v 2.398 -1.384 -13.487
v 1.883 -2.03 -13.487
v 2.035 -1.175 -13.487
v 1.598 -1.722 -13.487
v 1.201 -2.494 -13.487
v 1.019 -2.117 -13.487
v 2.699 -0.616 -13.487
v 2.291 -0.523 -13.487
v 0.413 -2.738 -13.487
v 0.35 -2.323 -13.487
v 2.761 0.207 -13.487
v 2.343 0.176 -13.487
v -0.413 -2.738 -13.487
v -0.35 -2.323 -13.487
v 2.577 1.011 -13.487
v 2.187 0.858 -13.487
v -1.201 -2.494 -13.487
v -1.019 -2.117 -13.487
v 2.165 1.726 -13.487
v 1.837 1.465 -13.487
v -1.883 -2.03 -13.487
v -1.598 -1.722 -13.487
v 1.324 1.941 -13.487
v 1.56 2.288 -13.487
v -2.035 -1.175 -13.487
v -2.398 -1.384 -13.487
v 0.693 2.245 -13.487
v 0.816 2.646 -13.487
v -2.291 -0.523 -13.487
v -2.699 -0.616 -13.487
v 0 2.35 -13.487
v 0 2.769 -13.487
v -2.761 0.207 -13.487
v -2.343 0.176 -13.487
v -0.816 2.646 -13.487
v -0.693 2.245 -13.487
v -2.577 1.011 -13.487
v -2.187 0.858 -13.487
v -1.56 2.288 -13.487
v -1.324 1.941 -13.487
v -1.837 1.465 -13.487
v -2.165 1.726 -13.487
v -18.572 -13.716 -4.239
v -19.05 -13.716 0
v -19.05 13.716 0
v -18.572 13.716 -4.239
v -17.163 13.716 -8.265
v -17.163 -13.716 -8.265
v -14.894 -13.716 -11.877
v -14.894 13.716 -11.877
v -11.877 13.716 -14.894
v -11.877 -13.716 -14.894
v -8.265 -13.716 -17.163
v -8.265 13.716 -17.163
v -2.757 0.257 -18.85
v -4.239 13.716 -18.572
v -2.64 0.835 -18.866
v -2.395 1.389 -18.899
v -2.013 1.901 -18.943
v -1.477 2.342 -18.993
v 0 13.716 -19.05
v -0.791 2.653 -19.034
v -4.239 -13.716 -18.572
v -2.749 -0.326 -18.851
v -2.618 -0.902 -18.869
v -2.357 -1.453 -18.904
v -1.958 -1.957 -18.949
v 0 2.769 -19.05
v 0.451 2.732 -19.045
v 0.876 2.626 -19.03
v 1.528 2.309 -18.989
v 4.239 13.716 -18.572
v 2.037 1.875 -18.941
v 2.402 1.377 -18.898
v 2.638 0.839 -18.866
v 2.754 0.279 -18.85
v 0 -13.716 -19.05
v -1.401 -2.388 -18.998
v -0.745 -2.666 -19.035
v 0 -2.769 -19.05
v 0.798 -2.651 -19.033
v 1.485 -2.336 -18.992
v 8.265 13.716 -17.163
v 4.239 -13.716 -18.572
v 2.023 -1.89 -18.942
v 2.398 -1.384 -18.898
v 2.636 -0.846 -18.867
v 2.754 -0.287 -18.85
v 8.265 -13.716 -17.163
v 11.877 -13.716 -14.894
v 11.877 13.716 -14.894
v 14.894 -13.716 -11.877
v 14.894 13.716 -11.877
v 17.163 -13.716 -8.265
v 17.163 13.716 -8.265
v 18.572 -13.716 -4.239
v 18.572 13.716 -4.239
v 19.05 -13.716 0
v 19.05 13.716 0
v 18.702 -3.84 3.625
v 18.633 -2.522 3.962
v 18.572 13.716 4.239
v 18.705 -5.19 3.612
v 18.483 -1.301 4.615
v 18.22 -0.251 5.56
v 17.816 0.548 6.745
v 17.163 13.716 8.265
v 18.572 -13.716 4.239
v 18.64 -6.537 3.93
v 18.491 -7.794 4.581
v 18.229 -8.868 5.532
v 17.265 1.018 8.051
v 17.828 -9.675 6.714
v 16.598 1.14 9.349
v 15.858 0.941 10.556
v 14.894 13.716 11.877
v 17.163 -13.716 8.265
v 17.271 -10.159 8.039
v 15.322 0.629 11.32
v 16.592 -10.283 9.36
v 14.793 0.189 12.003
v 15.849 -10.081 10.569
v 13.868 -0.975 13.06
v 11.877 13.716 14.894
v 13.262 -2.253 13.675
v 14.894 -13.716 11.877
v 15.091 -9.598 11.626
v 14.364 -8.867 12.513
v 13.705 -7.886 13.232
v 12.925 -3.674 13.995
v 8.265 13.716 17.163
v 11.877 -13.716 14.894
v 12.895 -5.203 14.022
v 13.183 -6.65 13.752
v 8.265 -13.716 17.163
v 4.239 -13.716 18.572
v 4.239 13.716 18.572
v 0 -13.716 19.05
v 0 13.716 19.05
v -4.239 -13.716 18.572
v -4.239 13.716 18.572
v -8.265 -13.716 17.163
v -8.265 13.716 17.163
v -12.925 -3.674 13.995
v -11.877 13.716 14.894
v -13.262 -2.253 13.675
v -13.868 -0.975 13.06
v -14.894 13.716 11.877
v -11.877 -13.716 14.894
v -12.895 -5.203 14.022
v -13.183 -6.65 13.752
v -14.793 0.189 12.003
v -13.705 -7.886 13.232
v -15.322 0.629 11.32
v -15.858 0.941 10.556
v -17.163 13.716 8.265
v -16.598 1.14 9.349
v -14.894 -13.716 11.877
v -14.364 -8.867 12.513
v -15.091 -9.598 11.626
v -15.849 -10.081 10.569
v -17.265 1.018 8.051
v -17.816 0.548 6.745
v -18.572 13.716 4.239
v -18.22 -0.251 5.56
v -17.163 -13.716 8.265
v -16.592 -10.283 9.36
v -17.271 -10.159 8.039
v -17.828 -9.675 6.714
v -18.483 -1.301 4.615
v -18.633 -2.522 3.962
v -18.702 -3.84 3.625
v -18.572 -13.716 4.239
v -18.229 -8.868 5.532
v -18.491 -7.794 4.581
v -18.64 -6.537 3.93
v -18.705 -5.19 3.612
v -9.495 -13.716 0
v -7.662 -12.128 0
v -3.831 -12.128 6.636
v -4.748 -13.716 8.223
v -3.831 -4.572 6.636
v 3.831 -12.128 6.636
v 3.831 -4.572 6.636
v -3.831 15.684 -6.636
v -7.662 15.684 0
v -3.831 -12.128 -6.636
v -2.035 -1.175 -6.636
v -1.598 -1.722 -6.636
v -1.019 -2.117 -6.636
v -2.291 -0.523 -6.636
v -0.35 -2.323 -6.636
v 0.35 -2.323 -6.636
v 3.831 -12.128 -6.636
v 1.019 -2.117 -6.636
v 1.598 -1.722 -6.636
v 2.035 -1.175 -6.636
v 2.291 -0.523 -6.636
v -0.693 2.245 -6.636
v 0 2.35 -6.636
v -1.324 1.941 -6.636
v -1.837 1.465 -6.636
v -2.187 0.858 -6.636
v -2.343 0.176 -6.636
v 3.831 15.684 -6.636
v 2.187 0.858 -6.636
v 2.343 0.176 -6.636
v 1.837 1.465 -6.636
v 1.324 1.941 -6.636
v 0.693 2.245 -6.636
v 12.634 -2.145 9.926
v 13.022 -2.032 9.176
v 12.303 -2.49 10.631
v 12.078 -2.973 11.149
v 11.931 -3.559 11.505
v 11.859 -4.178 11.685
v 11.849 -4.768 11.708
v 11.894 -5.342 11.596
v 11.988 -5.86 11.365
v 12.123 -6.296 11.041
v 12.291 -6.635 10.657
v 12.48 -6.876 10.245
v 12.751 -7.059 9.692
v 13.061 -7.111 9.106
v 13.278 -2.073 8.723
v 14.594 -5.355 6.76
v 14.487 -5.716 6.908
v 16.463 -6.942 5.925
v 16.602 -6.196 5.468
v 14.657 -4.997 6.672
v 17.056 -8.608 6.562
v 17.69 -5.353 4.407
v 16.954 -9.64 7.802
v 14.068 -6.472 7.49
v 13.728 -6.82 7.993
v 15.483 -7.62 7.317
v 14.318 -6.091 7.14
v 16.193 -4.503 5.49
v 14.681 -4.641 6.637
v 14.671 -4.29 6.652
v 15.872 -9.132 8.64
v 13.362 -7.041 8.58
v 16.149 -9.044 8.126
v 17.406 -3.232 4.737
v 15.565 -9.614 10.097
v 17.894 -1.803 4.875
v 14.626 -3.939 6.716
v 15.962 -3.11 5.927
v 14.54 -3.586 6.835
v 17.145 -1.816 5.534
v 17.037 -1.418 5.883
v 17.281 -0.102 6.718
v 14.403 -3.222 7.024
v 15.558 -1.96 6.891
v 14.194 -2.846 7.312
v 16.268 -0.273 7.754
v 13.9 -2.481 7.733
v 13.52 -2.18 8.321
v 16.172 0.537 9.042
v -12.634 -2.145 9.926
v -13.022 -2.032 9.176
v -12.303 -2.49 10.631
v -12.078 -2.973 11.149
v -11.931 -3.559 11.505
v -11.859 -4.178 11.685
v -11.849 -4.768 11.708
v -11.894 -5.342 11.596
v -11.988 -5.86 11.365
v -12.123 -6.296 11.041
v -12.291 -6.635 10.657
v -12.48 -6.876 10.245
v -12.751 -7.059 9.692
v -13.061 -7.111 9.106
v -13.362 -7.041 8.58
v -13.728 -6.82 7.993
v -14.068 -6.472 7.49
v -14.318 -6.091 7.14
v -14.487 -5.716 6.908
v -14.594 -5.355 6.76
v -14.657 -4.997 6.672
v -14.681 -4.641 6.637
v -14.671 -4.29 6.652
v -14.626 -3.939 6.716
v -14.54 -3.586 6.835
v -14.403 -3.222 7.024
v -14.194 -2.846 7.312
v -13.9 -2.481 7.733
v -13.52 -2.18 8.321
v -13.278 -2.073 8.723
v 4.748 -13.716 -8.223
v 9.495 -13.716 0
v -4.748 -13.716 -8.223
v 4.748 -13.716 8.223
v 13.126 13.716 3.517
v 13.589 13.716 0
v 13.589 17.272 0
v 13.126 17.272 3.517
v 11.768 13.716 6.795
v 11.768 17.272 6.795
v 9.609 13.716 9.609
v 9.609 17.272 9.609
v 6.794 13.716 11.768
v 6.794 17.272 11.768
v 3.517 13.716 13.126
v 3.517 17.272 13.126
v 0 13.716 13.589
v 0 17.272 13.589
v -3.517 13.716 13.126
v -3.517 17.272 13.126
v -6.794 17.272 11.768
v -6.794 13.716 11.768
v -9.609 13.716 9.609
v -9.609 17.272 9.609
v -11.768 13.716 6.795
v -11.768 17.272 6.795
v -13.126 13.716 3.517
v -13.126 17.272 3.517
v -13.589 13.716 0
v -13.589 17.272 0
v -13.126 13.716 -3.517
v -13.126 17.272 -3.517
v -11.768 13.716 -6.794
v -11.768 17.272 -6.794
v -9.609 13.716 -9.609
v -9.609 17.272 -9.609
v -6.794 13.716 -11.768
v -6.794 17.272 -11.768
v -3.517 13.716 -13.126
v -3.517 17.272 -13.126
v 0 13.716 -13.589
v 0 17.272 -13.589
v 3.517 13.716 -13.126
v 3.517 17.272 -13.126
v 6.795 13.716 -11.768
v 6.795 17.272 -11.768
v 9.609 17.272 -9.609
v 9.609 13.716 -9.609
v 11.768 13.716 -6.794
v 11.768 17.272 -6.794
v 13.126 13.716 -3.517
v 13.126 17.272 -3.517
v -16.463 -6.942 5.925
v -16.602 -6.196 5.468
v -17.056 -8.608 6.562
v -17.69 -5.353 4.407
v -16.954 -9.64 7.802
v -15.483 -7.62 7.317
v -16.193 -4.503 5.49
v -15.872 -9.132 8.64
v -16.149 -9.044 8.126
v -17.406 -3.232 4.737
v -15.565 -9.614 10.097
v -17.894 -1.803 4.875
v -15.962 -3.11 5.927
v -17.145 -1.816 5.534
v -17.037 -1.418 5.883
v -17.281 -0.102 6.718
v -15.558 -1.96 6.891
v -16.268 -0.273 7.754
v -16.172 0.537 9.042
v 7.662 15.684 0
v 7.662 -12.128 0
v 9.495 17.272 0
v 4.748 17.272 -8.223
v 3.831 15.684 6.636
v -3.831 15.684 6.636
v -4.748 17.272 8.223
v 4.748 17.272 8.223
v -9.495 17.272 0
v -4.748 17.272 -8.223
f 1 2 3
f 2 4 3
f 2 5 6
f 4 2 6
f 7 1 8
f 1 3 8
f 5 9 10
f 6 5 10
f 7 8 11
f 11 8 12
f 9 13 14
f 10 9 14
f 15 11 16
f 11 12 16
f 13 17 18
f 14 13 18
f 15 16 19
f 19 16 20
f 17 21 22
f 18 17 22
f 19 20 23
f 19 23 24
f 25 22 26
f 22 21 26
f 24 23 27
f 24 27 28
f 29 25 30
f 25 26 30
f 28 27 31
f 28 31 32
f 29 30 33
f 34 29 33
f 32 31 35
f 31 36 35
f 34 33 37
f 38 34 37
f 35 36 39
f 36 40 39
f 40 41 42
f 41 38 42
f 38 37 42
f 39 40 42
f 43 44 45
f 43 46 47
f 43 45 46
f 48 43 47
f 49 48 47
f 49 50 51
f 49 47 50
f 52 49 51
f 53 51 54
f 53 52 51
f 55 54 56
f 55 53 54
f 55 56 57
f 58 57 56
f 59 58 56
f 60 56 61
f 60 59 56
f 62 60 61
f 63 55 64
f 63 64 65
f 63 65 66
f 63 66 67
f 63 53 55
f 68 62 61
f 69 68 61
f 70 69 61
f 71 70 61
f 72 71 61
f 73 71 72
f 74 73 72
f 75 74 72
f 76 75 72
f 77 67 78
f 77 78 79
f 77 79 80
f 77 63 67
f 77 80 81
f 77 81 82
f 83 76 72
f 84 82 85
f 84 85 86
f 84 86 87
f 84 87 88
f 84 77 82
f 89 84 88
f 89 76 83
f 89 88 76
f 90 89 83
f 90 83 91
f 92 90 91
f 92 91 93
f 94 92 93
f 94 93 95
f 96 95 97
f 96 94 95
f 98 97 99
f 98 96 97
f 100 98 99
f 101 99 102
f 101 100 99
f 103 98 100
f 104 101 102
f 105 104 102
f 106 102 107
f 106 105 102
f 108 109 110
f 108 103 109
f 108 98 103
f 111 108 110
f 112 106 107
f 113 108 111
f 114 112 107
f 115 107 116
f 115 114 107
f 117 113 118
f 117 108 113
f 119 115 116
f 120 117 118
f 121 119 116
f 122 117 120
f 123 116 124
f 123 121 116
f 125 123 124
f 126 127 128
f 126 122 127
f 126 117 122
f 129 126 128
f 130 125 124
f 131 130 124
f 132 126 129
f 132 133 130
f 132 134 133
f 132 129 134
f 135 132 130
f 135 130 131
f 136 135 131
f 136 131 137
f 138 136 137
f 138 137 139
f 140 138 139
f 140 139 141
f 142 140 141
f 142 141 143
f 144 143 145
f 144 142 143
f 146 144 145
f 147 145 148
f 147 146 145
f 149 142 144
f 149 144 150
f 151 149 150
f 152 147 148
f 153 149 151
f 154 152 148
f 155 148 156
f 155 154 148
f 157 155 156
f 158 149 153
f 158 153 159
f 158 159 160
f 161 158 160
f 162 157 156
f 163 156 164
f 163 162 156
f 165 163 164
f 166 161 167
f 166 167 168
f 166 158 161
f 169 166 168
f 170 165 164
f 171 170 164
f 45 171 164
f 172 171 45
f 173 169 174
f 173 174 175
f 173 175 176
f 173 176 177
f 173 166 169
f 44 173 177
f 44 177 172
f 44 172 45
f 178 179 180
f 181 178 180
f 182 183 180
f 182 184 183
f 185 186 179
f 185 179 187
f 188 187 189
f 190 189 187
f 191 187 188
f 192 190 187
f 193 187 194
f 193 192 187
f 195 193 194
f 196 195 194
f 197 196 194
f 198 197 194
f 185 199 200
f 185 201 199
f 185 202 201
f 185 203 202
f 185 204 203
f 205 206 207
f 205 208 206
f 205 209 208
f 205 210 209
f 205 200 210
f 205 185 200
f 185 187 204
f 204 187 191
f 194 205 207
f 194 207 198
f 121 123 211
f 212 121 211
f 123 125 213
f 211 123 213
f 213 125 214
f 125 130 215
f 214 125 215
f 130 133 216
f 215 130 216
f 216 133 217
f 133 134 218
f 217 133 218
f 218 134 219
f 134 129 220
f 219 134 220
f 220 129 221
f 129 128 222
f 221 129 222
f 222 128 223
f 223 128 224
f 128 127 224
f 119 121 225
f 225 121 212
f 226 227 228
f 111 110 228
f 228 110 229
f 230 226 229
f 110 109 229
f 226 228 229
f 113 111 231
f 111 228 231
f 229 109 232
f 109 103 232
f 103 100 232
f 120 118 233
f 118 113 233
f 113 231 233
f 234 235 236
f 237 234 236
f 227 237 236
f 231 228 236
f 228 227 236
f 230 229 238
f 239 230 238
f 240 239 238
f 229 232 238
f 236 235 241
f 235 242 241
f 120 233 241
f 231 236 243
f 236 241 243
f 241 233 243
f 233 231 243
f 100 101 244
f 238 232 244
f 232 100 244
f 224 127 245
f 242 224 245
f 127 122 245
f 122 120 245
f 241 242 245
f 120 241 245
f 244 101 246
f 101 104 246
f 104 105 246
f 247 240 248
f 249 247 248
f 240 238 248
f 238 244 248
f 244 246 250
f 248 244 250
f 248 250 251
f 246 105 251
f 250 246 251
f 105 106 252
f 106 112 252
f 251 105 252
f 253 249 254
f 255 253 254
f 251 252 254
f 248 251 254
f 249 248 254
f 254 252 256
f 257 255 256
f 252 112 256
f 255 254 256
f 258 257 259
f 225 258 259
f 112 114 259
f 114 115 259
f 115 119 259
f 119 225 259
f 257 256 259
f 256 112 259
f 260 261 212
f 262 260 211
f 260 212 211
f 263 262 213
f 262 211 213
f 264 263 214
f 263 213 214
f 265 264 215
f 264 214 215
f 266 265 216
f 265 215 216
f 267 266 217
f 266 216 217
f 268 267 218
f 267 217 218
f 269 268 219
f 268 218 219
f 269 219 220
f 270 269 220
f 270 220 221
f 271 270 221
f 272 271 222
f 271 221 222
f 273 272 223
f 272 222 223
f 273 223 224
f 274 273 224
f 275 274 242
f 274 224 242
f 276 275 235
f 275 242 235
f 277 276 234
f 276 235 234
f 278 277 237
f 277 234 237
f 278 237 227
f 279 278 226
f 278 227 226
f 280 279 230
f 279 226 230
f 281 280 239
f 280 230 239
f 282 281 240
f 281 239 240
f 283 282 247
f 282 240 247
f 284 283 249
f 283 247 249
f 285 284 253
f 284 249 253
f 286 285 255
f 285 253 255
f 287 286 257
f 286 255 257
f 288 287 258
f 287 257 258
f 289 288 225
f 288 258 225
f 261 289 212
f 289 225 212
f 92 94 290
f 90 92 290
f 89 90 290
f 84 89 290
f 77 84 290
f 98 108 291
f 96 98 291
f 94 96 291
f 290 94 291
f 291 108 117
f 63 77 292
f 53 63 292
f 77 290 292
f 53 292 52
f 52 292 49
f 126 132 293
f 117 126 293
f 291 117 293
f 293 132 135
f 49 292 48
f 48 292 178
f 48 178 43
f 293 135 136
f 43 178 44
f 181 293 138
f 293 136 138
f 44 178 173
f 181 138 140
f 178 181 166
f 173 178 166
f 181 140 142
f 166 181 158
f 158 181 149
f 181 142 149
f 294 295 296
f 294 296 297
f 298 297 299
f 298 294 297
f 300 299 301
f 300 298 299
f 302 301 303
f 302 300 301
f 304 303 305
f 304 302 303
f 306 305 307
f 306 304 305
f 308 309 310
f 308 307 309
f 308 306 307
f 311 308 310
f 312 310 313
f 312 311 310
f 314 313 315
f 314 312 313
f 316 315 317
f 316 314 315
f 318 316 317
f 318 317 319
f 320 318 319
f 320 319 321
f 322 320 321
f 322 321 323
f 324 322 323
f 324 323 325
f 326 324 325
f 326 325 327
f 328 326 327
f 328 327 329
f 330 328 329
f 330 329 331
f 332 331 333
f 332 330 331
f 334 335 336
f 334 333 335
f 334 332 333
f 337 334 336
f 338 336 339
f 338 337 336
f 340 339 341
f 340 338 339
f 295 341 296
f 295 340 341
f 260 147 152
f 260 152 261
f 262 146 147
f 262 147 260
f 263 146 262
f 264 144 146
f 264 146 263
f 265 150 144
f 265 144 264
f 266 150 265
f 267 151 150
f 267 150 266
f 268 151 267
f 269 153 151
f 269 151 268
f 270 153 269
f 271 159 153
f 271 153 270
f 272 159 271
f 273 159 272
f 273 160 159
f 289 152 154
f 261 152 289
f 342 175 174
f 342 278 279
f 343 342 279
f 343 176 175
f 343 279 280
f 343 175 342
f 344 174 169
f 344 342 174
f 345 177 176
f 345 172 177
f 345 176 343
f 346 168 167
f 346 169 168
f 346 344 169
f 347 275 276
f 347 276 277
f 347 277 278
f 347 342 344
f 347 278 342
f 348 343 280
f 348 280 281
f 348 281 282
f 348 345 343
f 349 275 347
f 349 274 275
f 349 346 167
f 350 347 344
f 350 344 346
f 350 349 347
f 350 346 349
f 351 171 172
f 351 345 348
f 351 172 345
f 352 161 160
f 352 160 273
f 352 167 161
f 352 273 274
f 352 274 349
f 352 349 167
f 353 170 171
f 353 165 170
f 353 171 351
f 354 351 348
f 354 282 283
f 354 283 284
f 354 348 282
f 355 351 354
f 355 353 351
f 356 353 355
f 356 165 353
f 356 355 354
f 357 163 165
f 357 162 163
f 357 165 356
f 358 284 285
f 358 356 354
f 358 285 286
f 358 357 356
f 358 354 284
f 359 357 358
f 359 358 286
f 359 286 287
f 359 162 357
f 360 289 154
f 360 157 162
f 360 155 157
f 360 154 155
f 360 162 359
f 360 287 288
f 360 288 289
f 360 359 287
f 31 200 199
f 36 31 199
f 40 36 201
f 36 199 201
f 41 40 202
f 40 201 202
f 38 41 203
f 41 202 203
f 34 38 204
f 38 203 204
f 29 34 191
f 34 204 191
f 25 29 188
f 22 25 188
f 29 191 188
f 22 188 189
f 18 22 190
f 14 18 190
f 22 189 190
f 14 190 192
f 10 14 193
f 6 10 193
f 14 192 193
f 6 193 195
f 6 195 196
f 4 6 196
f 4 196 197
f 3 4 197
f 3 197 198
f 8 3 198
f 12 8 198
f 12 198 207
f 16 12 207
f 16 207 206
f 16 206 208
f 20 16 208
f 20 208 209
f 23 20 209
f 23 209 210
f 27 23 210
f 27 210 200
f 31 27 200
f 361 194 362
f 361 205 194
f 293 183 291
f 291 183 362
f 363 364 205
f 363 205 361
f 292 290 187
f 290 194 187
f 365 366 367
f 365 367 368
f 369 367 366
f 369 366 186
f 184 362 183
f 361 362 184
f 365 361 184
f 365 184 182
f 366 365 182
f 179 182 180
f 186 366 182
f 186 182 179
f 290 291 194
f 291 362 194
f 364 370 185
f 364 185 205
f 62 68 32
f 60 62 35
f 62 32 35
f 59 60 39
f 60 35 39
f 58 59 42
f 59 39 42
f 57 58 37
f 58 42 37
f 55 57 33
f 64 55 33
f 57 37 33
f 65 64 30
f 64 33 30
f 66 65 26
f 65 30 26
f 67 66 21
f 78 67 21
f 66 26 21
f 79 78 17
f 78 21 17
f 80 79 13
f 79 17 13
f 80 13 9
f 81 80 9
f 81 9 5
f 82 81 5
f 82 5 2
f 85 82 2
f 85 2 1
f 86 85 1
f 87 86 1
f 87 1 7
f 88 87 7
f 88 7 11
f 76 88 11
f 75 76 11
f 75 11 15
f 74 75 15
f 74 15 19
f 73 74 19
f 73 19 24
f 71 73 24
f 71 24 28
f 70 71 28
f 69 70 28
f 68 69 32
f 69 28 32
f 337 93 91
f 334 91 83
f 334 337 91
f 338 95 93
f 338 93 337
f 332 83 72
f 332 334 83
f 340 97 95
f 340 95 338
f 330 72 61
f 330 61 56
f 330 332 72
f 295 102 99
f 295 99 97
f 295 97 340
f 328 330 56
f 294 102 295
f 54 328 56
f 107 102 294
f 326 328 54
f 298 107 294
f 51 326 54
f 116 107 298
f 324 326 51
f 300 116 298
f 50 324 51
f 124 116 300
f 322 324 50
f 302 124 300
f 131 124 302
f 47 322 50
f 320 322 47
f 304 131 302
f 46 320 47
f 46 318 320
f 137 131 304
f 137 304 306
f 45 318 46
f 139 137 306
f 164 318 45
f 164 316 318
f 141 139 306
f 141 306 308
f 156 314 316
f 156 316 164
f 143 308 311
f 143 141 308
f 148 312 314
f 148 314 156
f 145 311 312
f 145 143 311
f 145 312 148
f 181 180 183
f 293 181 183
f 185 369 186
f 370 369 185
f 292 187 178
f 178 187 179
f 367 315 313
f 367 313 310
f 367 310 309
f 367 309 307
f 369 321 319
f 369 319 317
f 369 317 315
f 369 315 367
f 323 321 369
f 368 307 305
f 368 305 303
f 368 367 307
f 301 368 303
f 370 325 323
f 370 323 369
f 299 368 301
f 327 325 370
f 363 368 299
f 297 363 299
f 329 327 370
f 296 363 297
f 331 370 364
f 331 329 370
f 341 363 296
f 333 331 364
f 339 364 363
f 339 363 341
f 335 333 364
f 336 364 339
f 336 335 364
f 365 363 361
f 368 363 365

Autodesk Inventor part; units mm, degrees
ref_plane "YZ Plane" through (0, 0, 0) normal (1, 0, 0) x (0, 1, 0)
ref_plane "XZ Plane" through (0, 0, 0) normal (0, 1, 0) x (-1, 0, 0)
sketch "Sketch9" plane through (0, 0, 0) normal (0, 1, 0) x (-1, 0, 0)
  circle A0 centre (0, 0) radius 19.05
  dimension "d53" = 38.1
extrude "Extrusion6" add sketch "Sketch9" along normal mid plane 27.432
sketch "Sketch10" plane through (0, 13.716, 0) normal (0, 1, 0) x (1, 0, 0)
  circle A0 centre (0, 0) radius 13.589
  dimension "idWasher" = 27.178
extrude "Extrusion7" add sketch "Sketch10" along normal blind 3.556
sketch "Sketch11" plane through (0, 17.272, 0) normal (0, 1, 0) x (1, 0, 0)
  line L0 (7.6623, 0) -> (3.8312, -6.6358)
  line L1 (3.8312, -6.6358) -> (-3.8312, -6.6358)
  line L2 (-3.8312, -6.6358) -> (-7.6623, 0)
  line L3 (-7.6623, 0) -> (-3.8312, 6.6357)
  line L4 (-3.8312, 6.6357) -> (3.8312, 6.6357)
  line L5 (3.8312, 6.6357) -> (7.6623, 0)
  point P0 (0, 0)
  point P1 (0, 0)
  dimension "d59" = 13.2715
extrude "Extrusion8" cut sketch "Sketch11" against normal through all
sketch "Sketch12" plane through (0, 0, 0) normal (1, 0, 0) x (0, 1, 0)
  circle A0 centre (-4.572, 9.1758) radius 2.54
  line L0 (17.272, 0) -> (-13.716, 0) projected
  line L1 (-13.716, 19.05) -> (-13.716, -19.05) projected
  point P0 (0, 0)
  dimension "d62" = 5.08
  dimension "d63" = 9.1758
  dimension "oneThirdSpoolHeight" = 9.144
extrude "Extrusion9" cut sketch "Sketch12" along normal through all both and the other way through all
chamfer "Chamfer5" distance 3.175 angle 45 2 edges at (16.6229, -7.1087, 9.3048) (-16.6229, -7.1087, 9.3048)
ref_plane "Work Plane2" through (0, 0, -19.05) normal (0, 0, 1) x (1, 0, 0)
sketch "Sketch13" plane through (0, 0, -19.05) normal (0, 0, 1) x (1, 0, 0)
  point P0 (0, 0)
  point P1 (0, 0)
hole "Hole2" at (0, 0, -19.05) direction (0, 0, 1) diameter 4.699 depth 12.4143 counterbore diameter 5.5372 counterbore depth 5.5626
chamfer "Chamfer6" distance 1.5875 angle 45 12 edges at (-5.7467, 17.272, -3.3179) (0, 17.272, -6.6357) (5.7467, 17.272, -3.3179) (5.7467, 17.272, 3.3179) (0, 17.272, 6.6358) (-5.7467, 17.272, 3.3179) (0, -13.716, 6.6358) (5.7467, -13.716, 3.3179) (5.7467, -13.716, -3.3179) (0, -13.716, -6.6357) (-5.7467, -13.716, -3.3179) (-5.7467, -13.716, 3.3179)
equation "\"d53\" = spoolInteriorDiameter"
equation "\"d59\" = hexDiameter"
equation "\"d62\" = holeForString"
equation "\"d63\" = stringHoleCenterFromHexShaft"
equation "\"oneThirdSpoolHeight\" = 0.333333 * singleSpoolHeight"
equation "\"d67\" = stringHoleChamfer"
equation "\"d77\" = hexHoleChamfer"
equation "\"holeForString\" = stringDiameter + clearanceForString"
equation "\"stringDiameter\" = 3.048"
equation "\"clearanceForString\" = 2.032"
equation "\"spoolHeightWithoutSpacer\" = 69.85"
equation "\"hexShaftDiameter\" = 12.7"
equation "\"clearanceForHexShaft\" = 0.5715"
equation "\"hexDiameter\" = hexShaftDiameter + clearanceForHexShaft"
equation "\"supportChannels\" = 3.81"
equation "\"spoolInteriorDiameter\" = 38.1"
equation "\"spoolInteriroRadius\" = 0.5 * spoolInteriorDiameter"
equation "\"spoolExteriorDiameter\" = 88.9"
equation "\"spoolExteriorRadius\" = 0.5 * spoolExteriorDiameter"
equation "\"spoolFiletRadius\" = 0.5 * supportChannels"
equation "\"holeCenter\" = 0.25 * spoolHeightWithoutSpacer - 0.75 * supportChannels"
equation "\"hexHoleChamfer\" = 1.5875"
equation "\"stringHoleCenterFromHexShaft\" = 0.5 * hexDiameter + 0.5 * holeForString"
equation "\"textCircleDiameter\" = 0.75 * spoolExteriorDiameter"
equation "\"textHeight\" = 6.096"
equation "\"textDepth\" = 1.27"
equation "\"stringHoleChamfer\" = 3.175"
equation "\"spoolTotalHeight\" = 76.2"
equation "\"spaceHeight\" = spoolTotalHeight - spoolHeightWithoutSpacer"
equation "\"spacerDiameter\" = 24.13"
equation "\"singleSpoolHeight\" = 27.432"
properties part number "2SidedSpoolV04" material "PC/ABS Plastic"
